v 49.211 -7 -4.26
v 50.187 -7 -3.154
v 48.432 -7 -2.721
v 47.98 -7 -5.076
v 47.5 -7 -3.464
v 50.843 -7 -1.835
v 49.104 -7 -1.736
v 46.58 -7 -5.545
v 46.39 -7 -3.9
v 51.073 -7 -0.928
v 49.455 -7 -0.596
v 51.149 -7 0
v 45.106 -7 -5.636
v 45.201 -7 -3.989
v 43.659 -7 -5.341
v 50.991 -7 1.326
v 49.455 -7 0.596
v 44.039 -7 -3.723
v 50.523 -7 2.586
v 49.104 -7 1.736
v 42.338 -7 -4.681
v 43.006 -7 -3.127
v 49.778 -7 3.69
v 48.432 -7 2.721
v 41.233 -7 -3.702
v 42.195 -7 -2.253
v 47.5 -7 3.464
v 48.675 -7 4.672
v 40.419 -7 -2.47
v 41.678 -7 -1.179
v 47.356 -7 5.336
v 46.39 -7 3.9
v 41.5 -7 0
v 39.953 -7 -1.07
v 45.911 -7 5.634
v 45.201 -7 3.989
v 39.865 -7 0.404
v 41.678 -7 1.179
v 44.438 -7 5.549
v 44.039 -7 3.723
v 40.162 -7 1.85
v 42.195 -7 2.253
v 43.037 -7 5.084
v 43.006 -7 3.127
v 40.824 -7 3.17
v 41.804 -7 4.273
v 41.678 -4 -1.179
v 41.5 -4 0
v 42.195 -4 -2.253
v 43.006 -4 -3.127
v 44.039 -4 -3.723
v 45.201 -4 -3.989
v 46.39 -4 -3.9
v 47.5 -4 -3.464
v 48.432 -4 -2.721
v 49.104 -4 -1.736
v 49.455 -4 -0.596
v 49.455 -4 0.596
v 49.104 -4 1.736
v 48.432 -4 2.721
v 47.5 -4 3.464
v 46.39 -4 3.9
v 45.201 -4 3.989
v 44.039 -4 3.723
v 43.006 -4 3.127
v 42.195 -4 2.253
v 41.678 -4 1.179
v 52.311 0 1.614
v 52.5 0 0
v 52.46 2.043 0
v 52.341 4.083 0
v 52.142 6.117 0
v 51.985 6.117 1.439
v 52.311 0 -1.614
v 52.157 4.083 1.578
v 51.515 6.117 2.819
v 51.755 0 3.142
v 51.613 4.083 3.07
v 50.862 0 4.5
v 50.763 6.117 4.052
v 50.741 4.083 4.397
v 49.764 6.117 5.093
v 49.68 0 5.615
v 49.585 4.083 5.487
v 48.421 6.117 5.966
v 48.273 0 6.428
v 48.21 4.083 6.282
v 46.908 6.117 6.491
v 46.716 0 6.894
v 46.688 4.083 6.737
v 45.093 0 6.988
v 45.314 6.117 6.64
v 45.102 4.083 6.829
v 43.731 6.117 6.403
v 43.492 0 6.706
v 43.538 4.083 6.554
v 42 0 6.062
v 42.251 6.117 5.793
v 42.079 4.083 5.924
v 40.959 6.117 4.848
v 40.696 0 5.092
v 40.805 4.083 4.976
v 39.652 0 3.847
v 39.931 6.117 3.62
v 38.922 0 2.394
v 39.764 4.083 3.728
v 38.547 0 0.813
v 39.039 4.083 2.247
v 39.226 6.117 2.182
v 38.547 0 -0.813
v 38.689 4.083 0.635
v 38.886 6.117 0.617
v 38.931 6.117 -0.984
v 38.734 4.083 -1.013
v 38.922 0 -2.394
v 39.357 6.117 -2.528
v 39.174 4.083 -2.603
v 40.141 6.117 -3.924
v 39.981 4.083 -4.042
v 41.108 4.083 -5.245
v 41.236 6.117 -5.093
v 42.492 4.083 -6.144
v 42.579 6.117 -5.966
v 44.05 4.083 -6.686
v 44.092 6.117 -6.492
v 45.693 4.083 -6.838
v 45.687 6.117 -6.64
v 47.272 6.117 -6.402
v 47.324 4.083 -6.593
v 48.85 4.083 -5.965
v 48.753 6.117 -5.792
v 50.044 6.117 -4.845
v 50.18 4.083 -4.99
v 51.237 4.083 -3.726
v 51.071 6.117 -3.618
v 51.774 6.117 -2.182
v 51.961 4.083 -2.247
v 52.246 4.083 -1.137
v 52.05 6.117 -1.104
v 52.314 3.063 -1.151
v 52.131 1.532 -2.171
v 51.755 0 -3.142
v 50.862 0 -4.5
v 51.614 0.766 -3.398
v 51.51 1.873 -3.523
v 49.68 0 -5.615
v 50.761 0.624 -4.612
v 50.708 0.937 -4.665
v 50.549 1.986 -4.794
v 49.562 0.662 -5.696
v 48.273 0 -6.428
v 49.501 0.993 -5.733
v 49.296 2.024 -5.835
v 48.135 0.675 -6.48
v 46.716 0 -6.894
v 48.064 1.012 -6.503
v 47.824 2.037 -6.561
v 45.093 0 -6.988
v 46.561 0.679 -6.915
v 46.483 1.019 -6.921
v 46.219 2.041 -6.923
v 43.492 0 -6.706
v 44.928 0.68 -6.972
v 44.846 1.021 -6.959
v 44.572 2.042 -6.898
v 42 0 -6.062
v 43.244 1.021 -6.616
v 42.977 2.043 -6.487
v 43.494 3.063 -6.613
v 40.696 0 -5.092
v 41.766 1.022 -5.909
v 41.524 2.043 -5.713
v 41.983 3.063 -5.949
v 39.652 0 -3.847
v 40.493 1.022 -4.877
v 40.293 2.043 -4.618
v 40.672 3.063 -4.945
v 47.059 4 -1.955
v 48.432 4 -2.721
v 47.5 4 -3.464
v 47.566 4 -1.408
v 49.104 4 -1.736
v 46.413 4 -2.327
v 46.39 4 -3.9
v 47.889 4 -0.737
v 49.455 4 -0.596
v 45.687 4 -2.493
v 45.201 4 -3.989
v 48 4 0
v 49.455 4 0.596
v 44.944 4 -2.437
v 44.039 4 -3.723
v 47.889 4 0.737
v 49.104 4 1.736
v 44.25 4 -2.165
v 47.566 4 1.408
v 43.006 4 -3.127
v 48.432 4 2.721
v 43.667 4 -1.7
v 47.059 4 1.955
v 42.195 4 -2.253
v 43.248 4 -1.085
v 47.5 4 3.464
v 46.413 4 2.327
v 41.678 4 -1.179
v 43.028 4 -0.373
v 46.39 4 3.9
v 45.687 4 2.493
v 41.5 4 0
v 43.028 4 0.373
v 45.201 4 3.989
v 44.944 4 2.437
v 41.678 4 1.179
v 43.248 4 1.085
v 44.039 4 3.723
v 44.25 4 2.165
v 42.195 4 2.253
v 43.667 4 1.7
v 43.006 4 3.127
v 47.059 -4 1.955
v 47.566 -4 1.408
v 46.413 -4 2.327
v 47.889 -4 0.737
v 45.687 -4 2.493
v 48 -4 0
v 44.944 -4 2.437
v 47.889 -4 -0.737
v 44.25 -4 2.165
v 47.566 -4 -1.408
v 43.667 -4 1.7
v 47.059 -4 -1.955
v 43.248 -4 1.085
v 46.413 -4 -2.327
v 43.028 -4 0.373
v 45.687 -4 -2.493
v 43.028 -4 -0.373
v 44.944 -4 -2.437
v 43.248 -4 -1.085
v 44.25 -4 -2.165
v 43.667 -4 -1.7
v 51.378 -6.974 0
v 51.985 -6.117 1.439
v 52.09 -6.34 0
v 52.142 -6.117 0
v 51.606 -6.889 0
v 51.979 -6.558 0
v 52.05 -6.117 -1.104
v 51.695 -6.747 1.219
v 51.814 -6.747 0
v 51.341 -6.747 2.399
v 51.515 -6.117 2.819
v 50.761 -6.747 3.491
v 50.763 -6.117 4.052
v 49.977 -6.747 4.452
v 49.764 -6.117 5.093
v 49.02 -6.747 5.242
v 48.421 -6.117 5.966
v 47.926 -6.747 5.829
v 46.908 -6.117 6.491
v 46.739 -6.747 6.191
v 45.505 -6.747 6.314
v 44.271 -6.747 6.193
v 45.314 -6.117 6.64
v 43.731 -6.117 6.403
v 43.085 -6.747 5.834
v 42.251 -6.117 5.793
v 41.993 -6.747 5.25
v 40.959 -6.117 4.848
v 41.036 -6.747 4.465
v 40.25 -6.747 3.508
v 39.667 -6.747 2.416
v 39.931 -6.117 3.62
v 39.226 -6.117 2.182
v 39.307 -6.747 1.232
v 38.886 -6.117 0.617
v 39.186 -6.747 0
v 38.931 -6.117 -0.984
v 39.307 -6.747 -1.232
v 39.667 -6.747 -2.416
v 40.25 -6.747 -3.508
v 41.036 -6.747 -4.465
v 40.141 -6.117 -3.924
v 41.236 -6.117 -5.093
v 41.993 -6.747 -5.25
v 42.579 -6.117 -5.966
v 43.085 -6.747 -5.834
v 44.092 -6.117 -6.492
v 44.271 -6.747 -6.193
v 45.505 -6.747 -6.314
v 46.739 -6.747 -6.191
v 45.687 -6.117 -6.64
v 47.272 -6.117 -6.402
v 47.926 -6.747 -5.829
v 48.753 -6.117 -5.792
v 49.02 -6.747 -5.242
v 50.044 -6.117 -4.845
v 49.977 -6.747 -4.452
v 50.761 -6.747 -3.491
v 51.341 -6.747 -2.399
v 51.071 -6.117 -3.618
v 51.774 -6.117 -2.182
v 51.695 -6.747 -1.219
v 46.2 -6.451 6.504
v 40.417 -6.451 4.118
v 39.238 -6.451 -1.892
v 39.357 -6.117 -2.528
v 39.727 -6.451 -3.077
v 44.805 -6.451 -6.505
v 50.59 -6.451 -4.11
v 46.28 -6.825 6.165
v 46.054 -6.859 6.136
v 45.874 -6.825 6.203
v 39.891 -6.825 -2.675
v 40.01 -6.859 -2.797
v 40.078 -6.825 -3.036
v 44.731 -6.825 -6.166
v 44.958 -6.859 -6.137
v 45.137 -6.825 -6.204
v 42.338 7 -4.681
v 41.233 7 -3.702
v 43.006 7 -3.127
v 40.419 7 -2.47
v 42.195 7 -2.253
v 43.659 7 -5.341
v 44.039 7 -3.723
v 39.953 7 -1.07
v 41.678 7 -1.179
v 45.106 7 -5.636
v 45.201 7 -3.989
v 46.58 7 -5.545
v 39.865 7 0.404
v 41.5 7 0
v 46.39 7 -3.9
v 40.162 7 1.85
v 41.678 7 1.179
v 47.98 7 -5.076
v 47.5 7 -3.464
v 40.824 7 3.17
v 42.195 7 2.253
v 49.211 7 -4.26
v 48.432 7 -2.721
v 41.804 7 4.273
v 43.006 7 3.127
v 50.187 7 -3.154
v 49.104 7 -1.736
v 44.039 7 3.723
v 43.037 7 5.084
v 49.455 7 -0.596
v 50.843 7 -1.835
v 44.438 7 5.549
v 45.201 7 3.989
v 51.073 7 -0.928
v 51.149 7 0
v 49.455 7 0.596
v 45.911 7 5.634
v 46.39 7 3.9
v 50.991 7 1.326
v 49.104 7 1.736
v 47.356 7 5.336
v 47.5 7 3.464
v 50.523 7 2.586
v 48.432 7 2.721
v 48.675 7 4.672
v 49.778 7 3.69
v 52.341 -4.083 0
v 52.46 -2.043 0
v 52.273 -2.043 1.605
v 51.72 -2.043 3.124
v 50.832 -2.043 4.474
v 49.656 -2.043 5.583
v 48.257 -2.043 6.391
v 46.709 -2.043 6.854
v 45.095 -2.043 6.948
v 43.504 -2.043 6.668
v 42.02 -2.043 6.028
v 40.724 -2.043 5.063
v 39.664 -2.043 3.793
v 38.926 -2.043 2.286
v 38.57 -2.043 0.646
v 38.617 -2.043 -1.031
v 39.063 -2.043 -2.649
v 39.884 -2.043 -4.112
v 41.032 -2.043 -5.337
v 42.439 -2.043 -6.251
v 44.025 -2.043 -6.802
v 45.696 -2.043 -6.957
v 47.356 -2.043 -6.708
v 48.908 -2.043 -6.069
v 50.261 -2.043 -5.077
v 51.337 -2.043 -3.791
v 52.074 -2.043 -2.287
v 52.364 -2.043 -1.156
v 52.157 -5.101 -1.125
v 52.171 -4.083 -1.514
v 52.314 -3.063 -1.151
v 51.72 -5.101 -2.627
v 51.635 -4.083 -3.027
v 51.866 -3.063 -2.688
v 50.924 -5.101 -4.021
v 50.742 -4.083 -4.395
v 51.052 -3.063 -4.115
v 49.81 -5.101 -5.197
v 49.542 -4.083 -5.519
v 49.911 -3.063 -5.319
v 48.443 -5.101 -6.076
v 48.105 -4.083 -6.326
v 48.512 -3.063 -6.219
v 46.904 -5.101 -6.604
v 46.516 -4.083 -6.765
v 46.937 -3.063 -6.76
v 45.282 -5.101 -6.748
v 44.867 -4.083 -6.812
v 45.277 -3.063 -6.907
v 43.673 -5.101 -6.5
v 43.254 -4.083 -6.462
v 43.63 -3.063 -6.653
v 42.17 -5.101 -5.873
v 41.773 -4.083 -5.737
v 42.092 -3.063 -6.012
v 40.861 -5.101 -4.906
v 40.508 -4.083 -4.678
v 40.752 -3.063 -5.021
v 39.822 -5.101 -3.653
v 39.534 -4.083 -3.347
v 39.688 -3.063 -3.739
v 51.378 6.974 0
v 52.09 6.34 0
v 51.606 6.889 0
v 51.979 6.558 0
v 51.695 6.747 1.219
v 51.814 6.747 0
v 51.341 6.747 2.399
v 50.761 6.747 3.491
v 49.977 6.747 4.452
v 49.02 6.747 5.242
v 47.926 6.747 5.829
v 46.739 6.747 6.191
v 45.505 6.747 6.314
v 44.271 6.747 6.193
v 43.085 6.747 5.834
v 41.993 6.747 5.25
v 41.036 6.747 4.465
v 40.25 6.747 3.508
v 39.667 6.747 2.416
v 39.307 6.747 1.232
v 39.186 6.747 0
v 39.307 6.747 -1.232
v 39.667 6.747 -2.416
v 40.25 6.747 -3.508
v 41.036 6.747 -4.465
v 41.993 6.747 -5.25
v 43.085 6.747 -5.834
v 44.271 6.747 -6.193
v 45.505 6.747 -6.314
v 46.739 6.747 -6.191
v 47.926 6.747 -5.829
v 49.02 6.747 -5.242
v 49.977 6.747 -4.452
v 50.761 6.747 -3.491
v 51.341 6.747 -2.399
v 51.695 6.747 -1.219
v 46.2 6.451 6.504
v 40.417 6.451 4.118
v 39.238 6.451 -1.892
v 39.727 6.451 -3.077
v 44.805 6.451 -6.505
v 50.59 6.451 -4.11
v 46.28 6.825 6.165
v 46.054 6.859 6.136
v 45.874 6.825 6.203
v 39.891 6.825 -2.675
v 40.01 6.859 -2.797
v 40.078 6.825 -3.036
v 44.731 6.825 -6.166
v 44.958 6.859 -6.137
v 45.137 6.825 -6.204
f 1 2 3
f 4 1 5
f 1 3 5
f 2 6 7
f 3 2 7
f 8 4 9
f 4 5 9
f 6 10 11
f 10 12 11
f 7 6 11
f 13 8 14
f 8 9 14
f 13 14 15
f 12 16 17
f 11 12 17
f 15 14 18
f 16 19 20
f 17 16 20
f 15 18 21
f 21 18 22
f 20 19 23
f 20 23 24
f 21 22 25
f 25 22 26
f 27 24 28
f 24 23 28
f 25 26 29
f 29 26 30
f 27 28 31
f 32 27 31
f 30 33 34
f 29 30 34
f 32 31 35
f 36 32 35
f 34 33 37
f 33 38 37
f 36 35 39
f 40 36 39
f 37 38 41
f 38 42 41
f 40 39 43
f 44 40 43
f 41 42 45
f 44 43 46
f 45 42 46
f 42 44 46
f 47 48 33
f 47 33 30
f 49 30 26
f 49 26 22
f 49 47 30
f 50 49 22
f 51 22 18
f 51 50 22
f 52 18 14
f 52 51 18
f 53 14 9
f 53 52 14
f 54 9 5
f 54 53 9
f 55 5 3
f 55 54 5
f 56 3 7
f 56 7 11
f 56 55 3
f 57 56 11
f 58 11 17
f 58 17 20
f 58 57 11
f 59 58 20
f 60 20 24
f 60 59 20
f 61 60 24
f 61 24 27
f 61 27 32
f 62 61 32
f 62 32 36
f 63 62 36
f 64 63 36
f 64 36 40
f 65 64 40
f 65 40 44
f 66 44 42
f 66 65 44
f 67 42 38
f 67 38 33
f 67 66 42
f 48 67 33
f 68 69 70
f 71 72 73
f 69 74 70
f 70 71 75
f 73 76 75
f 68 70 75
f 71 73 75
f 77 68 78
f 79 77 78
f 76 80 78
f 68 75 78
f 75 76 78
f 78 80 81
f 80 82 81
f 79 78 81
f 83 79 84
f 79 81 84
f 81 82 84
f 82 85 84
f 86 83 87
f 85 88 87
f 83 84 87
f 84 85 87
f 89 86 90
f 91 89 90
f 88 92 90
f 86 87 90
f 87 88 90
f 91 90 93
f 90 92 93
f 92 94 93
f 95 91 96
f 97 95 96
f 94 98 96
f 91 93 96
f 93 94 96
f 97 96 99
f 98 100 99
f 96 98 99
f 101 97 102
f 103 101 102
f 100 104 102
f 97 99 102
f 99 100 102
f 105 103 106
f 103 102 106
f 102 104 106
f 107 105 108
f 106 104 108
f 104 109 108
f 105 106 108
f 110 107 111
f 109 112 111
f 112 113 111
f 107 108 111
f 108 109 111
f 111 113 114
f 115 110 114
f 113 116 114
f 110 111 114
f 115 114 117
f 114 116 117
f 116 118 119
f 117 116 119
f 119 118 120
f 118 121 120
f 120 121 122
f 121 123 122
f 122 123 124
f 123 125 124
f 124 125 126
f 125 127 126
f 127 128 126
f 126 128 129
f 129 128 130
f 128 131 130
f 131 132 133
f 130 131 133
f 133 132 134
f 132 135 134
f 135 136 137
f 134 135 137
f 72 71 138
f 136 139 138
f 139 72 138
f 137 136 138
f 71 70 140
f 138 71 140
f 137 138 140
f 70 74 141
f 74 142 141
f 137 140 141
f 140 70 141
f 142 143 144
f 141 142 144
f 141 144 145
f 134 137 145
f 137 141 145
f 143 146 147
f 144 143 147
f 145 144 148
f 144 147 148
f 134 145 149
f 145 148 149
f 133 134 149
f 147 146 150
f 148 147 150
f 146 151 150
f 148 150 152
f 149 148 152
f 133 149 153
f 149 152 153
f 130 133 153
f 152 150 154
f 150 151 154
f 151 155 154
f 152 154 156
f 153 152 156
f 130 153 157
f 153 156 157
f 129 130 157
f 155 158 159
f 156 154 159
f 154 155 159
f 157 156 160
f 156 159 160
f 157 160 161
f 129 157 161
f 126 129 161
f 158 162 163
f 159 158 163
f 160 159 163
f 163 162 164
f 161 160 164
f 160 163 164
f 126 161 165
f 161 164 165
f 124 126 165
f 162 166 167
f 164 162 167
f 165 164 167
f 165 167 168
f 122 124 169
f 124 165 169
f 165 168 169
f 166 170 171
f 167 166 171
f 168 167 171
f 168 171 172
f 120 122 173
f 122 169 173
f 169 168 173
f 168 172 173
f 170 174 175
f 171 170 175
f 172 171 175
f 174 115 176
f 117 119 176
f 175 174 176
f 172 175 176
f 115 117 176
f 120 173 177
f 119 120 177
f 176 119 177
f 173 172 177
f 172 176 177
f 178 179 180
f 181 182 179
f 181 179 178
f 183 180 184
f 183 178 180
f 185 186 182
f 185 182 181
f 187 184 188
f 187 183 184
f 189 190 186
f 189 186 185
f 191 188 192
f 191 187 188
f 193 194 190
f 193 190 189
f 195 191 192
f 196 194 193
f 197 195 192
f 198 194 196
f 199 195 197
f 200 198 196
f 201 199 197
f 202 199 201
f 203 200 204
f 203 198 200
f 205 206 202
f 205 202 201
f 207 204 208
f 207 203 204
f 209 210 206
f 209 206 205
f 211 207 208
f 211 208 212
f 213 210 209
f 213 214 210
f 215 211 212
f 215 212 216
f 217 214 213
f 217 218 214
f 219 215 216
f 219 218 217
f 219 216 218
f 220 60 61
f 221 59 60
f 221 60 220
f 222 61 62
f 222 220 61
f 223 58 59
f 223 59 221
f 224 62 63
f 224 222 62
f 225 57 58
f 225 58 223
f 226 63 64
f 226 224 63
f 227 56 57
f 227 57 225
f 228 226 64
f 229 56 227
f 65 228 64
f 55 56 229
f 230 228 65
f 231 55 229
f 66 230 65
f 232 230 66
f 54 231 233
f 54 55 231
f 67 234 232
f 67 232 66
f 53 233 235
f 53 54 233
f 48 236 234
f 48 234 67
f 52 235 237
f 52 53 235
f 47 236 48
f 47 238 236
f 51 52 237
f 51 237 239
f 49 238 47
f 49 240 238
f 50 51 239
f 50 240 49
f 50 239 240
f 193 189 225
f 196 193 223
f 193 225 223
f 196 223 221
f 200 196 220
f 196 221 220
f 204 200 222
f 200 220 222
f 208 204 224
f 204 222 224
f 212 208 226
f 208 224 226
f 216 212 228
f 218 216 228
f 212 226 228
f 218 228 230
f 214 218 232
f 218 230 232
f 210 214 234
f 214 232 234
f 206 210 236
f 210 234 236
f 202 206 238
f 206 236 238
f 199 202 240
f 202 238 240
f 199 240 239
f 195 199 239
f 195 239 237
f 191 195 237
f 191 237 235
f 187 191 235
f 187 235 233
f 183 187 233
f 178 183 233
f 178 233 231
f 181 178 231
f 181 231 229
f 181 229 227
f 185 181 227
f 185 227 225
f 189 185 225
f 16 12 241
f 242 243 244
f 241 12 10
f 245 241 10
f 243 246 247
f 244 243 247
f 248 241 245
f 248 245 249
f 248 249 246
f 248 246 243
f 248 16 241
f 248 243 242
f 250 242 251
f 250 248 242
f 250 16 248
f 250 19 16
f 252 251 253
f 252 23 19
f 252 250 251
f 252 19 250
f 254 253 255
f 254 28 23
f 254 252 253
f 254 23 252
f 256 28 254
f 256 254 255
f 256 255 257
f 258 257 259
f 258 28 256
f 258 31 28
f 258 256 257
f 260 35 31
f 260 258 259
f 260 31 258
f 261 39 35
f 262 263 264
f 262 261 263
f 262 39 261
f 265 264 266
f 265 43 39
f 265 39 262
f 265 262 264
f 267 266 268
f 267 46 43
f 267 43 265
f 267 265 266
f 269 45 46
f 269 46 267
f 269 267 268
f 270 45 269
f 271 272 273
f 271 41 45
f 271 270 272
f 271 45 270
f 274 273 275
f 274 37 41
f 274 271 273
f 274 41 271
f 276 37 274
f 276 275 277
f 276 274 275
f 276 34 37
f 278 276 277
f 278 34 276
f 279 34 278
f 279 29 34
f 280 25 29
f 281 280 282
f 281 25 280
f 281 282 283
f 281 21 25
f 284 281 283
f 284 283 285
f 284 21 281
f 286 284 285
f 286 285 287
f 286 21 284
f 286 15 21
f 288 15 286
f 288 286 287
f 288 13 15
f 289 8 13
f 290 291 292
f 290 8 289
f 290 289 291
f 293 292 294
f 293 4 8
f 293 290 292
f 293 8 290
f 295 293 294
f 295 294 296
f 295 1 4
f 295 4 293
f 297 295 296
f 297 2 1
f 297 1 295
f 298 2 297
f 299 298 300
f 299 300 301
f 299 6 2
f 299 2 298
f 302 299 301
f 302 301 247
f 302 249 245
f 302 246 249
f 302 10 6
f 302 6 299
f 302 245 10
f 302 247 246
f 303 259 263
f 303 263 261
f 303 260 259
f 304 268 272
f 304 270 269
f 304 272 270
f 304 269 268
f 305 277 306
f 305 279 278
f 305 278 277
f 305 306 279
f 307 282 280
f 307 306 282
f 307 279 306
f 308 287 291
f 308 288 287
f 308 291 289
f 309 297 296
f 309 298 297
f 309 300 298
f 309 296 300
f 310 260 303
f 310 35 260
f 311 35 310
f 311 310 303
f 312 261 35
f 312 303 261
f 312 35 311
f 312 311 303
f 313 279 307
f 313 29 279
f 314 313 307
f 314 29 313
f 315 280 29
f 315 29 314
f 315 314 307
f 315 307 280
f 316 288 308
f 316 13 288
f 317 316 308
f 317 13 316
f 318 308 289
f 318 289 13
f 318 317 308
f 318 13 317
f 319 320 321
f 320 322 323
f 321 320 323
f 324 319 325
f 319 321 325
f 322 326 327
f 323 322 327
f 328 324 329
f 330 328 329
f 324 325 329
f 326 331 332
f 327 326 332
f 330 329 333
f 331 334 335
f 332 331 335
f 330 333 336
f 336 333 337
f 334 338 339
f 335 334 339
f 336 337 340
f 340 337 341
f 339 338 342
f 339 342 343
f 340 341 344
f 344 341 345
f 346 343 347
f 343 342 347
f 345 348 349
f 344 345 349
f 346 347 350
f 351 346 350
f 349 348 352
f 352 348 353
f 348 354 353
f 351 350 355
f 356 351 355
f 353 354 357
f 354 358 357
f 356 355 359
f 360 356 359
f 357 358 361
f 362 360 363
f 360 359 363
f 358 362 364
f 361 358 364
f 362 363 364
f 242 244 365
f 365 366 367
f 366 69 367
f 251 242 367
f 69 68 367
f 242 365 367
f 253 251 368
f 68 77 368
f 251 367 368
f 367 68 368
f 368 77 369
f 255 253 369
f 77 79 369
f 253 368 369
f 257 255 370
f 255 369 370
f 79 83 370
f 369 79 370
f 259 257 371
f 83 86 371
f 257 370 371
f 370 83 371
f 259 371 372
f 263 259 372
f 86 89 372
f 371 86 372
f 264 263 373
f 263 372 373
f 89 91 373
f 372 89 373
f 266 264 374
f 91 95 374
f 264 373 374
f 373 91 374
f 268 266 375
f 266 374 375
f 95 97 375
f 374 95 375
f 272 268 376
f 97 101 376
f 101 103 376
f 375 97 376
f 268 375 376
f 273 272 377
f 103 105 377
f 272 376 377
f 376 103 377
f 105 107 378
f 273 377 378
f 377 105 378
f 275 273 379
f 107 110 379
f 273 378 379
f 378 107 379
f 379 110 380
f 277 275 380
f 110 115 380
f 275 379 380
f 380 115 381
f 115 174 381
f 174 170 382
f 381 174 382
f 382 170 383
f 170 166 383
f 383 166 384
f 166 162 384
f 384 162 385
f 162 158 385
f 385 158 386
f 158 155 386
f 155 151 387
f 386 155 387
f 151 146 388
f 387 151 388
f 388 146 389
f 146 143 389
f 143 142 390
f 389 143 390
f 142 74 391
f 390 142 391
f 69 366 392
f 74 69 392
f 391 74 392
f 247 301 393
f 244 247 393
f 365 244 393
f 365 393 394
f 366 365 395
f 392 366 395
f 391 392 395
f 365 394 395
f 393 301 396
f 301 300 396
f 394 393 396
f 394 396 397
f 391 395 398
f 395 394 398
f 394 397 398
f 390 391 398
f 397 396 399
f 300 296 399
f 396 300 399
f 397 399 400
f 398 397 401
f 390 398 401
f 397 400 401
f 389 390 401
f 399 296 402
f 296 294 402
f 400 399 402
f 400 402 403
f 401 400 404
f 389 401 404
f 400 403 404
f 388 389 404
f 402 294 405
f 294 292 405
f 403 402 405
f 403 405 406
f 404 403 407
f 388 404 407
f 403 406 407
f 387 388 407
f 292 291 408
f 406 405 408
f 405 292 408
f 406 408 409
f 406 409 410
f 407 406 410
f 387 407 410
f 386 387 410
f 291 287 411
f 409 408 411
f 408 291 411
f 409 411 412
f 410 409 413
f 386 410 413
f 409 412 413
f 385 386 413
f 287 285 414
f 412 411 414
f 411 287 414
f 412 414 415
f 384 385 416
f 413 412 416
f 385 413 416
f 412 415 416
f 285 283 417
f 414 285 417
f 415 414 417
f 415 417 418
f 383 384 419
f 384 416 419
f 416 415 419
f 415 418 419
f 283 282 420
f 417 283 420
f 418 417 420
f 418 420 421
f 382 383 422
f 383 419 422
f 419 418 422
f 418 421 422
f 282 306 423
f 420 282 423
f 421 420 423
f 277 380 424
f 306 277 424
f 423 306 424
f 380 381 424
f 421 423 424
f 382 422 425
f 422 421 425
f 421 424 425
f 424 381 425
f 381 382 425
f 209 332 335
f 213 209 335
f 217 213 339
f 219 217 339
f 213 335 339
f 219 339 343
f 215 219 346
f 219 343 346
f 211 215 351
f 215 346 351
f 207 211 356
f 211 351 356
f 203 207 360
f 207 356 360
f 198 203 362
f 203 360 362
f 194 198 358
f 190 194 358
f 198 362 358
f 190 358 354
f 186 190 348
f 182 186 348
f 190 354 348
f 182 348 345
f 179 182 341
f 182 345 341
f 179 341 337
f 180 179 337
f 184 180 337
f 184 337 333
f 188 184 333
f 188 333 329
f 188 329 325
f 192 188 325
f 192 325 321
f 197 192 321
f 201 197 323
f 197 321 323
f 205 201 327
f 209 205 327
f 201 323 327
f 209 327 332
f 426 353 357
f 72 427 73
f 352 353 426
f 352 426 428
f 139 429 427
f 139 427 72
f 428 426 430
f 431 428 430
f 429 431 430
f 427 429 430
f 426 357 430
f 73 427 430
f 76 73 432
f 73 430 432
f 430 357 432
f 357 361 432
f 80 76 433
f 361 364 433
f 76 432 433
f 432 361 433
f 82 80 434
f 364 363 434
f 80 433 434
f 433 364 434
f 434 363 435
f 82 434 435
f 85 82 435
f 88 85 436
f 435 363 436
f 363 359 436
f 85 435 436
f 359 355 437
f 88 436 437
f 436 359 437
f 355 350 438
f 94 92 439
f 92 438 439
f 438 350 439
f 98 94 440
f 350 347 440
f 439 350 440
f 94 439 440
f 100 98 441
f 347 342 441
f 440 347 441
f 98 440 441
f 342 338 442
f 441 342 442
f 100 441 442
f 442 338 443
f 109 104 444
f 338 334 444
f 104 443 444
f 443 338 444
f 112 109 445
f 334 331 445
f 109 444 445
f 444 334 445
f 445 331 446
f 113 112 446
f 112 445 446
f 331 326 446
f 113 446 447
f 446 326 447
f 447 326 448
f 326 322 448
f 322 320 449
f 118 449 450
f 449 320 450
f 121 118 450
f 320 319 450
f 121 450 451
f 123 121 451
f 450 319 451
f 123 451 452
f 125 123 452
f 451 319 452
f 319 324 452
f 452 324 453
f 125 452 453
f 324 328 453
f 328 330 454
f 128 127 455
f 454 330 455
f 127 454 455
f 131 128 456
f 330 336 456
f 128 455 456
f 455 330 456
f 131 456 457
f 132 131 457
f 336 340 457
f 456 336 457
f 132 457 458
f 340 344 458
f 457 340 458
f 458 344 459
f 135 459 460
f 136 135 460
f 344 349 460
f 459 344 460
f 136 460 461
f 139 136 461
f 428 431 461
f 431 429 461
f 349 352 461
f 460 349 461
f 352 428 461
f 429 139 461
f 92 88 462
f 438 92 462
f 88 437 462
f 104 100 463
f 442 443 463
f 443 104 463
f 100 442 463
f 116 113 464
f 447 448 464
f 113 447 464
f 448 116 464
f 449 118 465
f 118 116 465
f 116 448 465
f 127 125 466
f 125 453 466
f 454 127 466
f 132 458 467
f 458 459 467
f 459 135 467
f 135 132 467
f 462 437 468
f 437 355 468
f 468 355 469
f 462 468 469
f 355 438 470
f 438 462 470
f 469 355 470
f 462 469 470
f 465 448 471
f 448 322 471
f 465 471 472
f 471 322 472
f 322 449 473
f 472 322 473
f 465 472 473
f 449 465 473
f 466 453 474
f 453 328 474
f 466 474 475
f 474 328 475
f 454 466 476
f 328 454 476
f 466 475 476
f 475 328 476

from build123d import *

# Parameters (mm, degrees)
FILLET1_R          = 1
SKETCH2_R          = 2.5
CUT_EXTRUDE1_DEPTH = 55.783665583
SKETCH3_R          = 4
CUT_EXTRUDE2_DEPTH = 3
CUT_EXTRUDE3_START = -3
SKETCH4_R          = 4
CUT_EXTRUDE3_DEPTH = 3


with BuildPart() as part:
    # Sketch1 → Revolve2 (revolve)
    with BuildSketch(Plane.XY):
        with BuildLine():
            Line((52.031240616, 7), (45.5, 7))
            Line((45.5, 7), (45.5, -7))
            Line((45.5, -7), (52.031240616, -7))
            ThreePointArc((52.031240616, -7), (52.382679066, -3.507838913), (52.5, 0))
            ThreePointArc((52.5, 0), (52.382679066, 3.507838913), (52.031240616, 7))
        make_face()
    revolve(axis=Axis((45.5, 50.130379051, 0), (0, -1, 0)))

    # Fillet1
    fillet1_edges = [part.edges().sort_by_distance(p)[0] for p in [
        (38.968759384, 7, 0),
        (38.968759384, -7, 0),
    ]]
    fillet(fillet1_edges, radius=FILLET1_R)

    # Sketch2 → Cut-Extrude1 (cut, through all)
    with BuildSketch(Plane.XZ.offset(7)):
        with Locations((45.5, 0)):
            Circle(SKETCH2_R)
    extrude(amount=-CUT_EXTRUDE1_DEPTH, mode=Mode.SUBTRACT)

    # Sketch3 → Cut-Extrude2 (cut)
    with BuildSketch(Plane(origin=(0, 7, 0), x_dir=(1, 0, 0), z_dir=(0, 1, 0))):
        with Locations(Location((45.5, 0, 0), (0, 0, 180))):
            Circle(SKETCH3_R)
    extrude(amount=-CUT_EXTRUDE2_DEPTH, mode=Mode.SUBTRACT)

    # Sketch4 → Cut-Extrude3 (cut)
    with BuildSketch(Plane.XZ.offset(7).offset(CUT_EXTRUDE3_START)):
        with Locations(Location((45.5, 0, 0), (0, 0, 180))):
            Circle(SKETCH4_R)
    extrude(amount=CUT_EXTRUDE3_DEPTH, mode=Mode.SUBTRACT)


solid = part.part
